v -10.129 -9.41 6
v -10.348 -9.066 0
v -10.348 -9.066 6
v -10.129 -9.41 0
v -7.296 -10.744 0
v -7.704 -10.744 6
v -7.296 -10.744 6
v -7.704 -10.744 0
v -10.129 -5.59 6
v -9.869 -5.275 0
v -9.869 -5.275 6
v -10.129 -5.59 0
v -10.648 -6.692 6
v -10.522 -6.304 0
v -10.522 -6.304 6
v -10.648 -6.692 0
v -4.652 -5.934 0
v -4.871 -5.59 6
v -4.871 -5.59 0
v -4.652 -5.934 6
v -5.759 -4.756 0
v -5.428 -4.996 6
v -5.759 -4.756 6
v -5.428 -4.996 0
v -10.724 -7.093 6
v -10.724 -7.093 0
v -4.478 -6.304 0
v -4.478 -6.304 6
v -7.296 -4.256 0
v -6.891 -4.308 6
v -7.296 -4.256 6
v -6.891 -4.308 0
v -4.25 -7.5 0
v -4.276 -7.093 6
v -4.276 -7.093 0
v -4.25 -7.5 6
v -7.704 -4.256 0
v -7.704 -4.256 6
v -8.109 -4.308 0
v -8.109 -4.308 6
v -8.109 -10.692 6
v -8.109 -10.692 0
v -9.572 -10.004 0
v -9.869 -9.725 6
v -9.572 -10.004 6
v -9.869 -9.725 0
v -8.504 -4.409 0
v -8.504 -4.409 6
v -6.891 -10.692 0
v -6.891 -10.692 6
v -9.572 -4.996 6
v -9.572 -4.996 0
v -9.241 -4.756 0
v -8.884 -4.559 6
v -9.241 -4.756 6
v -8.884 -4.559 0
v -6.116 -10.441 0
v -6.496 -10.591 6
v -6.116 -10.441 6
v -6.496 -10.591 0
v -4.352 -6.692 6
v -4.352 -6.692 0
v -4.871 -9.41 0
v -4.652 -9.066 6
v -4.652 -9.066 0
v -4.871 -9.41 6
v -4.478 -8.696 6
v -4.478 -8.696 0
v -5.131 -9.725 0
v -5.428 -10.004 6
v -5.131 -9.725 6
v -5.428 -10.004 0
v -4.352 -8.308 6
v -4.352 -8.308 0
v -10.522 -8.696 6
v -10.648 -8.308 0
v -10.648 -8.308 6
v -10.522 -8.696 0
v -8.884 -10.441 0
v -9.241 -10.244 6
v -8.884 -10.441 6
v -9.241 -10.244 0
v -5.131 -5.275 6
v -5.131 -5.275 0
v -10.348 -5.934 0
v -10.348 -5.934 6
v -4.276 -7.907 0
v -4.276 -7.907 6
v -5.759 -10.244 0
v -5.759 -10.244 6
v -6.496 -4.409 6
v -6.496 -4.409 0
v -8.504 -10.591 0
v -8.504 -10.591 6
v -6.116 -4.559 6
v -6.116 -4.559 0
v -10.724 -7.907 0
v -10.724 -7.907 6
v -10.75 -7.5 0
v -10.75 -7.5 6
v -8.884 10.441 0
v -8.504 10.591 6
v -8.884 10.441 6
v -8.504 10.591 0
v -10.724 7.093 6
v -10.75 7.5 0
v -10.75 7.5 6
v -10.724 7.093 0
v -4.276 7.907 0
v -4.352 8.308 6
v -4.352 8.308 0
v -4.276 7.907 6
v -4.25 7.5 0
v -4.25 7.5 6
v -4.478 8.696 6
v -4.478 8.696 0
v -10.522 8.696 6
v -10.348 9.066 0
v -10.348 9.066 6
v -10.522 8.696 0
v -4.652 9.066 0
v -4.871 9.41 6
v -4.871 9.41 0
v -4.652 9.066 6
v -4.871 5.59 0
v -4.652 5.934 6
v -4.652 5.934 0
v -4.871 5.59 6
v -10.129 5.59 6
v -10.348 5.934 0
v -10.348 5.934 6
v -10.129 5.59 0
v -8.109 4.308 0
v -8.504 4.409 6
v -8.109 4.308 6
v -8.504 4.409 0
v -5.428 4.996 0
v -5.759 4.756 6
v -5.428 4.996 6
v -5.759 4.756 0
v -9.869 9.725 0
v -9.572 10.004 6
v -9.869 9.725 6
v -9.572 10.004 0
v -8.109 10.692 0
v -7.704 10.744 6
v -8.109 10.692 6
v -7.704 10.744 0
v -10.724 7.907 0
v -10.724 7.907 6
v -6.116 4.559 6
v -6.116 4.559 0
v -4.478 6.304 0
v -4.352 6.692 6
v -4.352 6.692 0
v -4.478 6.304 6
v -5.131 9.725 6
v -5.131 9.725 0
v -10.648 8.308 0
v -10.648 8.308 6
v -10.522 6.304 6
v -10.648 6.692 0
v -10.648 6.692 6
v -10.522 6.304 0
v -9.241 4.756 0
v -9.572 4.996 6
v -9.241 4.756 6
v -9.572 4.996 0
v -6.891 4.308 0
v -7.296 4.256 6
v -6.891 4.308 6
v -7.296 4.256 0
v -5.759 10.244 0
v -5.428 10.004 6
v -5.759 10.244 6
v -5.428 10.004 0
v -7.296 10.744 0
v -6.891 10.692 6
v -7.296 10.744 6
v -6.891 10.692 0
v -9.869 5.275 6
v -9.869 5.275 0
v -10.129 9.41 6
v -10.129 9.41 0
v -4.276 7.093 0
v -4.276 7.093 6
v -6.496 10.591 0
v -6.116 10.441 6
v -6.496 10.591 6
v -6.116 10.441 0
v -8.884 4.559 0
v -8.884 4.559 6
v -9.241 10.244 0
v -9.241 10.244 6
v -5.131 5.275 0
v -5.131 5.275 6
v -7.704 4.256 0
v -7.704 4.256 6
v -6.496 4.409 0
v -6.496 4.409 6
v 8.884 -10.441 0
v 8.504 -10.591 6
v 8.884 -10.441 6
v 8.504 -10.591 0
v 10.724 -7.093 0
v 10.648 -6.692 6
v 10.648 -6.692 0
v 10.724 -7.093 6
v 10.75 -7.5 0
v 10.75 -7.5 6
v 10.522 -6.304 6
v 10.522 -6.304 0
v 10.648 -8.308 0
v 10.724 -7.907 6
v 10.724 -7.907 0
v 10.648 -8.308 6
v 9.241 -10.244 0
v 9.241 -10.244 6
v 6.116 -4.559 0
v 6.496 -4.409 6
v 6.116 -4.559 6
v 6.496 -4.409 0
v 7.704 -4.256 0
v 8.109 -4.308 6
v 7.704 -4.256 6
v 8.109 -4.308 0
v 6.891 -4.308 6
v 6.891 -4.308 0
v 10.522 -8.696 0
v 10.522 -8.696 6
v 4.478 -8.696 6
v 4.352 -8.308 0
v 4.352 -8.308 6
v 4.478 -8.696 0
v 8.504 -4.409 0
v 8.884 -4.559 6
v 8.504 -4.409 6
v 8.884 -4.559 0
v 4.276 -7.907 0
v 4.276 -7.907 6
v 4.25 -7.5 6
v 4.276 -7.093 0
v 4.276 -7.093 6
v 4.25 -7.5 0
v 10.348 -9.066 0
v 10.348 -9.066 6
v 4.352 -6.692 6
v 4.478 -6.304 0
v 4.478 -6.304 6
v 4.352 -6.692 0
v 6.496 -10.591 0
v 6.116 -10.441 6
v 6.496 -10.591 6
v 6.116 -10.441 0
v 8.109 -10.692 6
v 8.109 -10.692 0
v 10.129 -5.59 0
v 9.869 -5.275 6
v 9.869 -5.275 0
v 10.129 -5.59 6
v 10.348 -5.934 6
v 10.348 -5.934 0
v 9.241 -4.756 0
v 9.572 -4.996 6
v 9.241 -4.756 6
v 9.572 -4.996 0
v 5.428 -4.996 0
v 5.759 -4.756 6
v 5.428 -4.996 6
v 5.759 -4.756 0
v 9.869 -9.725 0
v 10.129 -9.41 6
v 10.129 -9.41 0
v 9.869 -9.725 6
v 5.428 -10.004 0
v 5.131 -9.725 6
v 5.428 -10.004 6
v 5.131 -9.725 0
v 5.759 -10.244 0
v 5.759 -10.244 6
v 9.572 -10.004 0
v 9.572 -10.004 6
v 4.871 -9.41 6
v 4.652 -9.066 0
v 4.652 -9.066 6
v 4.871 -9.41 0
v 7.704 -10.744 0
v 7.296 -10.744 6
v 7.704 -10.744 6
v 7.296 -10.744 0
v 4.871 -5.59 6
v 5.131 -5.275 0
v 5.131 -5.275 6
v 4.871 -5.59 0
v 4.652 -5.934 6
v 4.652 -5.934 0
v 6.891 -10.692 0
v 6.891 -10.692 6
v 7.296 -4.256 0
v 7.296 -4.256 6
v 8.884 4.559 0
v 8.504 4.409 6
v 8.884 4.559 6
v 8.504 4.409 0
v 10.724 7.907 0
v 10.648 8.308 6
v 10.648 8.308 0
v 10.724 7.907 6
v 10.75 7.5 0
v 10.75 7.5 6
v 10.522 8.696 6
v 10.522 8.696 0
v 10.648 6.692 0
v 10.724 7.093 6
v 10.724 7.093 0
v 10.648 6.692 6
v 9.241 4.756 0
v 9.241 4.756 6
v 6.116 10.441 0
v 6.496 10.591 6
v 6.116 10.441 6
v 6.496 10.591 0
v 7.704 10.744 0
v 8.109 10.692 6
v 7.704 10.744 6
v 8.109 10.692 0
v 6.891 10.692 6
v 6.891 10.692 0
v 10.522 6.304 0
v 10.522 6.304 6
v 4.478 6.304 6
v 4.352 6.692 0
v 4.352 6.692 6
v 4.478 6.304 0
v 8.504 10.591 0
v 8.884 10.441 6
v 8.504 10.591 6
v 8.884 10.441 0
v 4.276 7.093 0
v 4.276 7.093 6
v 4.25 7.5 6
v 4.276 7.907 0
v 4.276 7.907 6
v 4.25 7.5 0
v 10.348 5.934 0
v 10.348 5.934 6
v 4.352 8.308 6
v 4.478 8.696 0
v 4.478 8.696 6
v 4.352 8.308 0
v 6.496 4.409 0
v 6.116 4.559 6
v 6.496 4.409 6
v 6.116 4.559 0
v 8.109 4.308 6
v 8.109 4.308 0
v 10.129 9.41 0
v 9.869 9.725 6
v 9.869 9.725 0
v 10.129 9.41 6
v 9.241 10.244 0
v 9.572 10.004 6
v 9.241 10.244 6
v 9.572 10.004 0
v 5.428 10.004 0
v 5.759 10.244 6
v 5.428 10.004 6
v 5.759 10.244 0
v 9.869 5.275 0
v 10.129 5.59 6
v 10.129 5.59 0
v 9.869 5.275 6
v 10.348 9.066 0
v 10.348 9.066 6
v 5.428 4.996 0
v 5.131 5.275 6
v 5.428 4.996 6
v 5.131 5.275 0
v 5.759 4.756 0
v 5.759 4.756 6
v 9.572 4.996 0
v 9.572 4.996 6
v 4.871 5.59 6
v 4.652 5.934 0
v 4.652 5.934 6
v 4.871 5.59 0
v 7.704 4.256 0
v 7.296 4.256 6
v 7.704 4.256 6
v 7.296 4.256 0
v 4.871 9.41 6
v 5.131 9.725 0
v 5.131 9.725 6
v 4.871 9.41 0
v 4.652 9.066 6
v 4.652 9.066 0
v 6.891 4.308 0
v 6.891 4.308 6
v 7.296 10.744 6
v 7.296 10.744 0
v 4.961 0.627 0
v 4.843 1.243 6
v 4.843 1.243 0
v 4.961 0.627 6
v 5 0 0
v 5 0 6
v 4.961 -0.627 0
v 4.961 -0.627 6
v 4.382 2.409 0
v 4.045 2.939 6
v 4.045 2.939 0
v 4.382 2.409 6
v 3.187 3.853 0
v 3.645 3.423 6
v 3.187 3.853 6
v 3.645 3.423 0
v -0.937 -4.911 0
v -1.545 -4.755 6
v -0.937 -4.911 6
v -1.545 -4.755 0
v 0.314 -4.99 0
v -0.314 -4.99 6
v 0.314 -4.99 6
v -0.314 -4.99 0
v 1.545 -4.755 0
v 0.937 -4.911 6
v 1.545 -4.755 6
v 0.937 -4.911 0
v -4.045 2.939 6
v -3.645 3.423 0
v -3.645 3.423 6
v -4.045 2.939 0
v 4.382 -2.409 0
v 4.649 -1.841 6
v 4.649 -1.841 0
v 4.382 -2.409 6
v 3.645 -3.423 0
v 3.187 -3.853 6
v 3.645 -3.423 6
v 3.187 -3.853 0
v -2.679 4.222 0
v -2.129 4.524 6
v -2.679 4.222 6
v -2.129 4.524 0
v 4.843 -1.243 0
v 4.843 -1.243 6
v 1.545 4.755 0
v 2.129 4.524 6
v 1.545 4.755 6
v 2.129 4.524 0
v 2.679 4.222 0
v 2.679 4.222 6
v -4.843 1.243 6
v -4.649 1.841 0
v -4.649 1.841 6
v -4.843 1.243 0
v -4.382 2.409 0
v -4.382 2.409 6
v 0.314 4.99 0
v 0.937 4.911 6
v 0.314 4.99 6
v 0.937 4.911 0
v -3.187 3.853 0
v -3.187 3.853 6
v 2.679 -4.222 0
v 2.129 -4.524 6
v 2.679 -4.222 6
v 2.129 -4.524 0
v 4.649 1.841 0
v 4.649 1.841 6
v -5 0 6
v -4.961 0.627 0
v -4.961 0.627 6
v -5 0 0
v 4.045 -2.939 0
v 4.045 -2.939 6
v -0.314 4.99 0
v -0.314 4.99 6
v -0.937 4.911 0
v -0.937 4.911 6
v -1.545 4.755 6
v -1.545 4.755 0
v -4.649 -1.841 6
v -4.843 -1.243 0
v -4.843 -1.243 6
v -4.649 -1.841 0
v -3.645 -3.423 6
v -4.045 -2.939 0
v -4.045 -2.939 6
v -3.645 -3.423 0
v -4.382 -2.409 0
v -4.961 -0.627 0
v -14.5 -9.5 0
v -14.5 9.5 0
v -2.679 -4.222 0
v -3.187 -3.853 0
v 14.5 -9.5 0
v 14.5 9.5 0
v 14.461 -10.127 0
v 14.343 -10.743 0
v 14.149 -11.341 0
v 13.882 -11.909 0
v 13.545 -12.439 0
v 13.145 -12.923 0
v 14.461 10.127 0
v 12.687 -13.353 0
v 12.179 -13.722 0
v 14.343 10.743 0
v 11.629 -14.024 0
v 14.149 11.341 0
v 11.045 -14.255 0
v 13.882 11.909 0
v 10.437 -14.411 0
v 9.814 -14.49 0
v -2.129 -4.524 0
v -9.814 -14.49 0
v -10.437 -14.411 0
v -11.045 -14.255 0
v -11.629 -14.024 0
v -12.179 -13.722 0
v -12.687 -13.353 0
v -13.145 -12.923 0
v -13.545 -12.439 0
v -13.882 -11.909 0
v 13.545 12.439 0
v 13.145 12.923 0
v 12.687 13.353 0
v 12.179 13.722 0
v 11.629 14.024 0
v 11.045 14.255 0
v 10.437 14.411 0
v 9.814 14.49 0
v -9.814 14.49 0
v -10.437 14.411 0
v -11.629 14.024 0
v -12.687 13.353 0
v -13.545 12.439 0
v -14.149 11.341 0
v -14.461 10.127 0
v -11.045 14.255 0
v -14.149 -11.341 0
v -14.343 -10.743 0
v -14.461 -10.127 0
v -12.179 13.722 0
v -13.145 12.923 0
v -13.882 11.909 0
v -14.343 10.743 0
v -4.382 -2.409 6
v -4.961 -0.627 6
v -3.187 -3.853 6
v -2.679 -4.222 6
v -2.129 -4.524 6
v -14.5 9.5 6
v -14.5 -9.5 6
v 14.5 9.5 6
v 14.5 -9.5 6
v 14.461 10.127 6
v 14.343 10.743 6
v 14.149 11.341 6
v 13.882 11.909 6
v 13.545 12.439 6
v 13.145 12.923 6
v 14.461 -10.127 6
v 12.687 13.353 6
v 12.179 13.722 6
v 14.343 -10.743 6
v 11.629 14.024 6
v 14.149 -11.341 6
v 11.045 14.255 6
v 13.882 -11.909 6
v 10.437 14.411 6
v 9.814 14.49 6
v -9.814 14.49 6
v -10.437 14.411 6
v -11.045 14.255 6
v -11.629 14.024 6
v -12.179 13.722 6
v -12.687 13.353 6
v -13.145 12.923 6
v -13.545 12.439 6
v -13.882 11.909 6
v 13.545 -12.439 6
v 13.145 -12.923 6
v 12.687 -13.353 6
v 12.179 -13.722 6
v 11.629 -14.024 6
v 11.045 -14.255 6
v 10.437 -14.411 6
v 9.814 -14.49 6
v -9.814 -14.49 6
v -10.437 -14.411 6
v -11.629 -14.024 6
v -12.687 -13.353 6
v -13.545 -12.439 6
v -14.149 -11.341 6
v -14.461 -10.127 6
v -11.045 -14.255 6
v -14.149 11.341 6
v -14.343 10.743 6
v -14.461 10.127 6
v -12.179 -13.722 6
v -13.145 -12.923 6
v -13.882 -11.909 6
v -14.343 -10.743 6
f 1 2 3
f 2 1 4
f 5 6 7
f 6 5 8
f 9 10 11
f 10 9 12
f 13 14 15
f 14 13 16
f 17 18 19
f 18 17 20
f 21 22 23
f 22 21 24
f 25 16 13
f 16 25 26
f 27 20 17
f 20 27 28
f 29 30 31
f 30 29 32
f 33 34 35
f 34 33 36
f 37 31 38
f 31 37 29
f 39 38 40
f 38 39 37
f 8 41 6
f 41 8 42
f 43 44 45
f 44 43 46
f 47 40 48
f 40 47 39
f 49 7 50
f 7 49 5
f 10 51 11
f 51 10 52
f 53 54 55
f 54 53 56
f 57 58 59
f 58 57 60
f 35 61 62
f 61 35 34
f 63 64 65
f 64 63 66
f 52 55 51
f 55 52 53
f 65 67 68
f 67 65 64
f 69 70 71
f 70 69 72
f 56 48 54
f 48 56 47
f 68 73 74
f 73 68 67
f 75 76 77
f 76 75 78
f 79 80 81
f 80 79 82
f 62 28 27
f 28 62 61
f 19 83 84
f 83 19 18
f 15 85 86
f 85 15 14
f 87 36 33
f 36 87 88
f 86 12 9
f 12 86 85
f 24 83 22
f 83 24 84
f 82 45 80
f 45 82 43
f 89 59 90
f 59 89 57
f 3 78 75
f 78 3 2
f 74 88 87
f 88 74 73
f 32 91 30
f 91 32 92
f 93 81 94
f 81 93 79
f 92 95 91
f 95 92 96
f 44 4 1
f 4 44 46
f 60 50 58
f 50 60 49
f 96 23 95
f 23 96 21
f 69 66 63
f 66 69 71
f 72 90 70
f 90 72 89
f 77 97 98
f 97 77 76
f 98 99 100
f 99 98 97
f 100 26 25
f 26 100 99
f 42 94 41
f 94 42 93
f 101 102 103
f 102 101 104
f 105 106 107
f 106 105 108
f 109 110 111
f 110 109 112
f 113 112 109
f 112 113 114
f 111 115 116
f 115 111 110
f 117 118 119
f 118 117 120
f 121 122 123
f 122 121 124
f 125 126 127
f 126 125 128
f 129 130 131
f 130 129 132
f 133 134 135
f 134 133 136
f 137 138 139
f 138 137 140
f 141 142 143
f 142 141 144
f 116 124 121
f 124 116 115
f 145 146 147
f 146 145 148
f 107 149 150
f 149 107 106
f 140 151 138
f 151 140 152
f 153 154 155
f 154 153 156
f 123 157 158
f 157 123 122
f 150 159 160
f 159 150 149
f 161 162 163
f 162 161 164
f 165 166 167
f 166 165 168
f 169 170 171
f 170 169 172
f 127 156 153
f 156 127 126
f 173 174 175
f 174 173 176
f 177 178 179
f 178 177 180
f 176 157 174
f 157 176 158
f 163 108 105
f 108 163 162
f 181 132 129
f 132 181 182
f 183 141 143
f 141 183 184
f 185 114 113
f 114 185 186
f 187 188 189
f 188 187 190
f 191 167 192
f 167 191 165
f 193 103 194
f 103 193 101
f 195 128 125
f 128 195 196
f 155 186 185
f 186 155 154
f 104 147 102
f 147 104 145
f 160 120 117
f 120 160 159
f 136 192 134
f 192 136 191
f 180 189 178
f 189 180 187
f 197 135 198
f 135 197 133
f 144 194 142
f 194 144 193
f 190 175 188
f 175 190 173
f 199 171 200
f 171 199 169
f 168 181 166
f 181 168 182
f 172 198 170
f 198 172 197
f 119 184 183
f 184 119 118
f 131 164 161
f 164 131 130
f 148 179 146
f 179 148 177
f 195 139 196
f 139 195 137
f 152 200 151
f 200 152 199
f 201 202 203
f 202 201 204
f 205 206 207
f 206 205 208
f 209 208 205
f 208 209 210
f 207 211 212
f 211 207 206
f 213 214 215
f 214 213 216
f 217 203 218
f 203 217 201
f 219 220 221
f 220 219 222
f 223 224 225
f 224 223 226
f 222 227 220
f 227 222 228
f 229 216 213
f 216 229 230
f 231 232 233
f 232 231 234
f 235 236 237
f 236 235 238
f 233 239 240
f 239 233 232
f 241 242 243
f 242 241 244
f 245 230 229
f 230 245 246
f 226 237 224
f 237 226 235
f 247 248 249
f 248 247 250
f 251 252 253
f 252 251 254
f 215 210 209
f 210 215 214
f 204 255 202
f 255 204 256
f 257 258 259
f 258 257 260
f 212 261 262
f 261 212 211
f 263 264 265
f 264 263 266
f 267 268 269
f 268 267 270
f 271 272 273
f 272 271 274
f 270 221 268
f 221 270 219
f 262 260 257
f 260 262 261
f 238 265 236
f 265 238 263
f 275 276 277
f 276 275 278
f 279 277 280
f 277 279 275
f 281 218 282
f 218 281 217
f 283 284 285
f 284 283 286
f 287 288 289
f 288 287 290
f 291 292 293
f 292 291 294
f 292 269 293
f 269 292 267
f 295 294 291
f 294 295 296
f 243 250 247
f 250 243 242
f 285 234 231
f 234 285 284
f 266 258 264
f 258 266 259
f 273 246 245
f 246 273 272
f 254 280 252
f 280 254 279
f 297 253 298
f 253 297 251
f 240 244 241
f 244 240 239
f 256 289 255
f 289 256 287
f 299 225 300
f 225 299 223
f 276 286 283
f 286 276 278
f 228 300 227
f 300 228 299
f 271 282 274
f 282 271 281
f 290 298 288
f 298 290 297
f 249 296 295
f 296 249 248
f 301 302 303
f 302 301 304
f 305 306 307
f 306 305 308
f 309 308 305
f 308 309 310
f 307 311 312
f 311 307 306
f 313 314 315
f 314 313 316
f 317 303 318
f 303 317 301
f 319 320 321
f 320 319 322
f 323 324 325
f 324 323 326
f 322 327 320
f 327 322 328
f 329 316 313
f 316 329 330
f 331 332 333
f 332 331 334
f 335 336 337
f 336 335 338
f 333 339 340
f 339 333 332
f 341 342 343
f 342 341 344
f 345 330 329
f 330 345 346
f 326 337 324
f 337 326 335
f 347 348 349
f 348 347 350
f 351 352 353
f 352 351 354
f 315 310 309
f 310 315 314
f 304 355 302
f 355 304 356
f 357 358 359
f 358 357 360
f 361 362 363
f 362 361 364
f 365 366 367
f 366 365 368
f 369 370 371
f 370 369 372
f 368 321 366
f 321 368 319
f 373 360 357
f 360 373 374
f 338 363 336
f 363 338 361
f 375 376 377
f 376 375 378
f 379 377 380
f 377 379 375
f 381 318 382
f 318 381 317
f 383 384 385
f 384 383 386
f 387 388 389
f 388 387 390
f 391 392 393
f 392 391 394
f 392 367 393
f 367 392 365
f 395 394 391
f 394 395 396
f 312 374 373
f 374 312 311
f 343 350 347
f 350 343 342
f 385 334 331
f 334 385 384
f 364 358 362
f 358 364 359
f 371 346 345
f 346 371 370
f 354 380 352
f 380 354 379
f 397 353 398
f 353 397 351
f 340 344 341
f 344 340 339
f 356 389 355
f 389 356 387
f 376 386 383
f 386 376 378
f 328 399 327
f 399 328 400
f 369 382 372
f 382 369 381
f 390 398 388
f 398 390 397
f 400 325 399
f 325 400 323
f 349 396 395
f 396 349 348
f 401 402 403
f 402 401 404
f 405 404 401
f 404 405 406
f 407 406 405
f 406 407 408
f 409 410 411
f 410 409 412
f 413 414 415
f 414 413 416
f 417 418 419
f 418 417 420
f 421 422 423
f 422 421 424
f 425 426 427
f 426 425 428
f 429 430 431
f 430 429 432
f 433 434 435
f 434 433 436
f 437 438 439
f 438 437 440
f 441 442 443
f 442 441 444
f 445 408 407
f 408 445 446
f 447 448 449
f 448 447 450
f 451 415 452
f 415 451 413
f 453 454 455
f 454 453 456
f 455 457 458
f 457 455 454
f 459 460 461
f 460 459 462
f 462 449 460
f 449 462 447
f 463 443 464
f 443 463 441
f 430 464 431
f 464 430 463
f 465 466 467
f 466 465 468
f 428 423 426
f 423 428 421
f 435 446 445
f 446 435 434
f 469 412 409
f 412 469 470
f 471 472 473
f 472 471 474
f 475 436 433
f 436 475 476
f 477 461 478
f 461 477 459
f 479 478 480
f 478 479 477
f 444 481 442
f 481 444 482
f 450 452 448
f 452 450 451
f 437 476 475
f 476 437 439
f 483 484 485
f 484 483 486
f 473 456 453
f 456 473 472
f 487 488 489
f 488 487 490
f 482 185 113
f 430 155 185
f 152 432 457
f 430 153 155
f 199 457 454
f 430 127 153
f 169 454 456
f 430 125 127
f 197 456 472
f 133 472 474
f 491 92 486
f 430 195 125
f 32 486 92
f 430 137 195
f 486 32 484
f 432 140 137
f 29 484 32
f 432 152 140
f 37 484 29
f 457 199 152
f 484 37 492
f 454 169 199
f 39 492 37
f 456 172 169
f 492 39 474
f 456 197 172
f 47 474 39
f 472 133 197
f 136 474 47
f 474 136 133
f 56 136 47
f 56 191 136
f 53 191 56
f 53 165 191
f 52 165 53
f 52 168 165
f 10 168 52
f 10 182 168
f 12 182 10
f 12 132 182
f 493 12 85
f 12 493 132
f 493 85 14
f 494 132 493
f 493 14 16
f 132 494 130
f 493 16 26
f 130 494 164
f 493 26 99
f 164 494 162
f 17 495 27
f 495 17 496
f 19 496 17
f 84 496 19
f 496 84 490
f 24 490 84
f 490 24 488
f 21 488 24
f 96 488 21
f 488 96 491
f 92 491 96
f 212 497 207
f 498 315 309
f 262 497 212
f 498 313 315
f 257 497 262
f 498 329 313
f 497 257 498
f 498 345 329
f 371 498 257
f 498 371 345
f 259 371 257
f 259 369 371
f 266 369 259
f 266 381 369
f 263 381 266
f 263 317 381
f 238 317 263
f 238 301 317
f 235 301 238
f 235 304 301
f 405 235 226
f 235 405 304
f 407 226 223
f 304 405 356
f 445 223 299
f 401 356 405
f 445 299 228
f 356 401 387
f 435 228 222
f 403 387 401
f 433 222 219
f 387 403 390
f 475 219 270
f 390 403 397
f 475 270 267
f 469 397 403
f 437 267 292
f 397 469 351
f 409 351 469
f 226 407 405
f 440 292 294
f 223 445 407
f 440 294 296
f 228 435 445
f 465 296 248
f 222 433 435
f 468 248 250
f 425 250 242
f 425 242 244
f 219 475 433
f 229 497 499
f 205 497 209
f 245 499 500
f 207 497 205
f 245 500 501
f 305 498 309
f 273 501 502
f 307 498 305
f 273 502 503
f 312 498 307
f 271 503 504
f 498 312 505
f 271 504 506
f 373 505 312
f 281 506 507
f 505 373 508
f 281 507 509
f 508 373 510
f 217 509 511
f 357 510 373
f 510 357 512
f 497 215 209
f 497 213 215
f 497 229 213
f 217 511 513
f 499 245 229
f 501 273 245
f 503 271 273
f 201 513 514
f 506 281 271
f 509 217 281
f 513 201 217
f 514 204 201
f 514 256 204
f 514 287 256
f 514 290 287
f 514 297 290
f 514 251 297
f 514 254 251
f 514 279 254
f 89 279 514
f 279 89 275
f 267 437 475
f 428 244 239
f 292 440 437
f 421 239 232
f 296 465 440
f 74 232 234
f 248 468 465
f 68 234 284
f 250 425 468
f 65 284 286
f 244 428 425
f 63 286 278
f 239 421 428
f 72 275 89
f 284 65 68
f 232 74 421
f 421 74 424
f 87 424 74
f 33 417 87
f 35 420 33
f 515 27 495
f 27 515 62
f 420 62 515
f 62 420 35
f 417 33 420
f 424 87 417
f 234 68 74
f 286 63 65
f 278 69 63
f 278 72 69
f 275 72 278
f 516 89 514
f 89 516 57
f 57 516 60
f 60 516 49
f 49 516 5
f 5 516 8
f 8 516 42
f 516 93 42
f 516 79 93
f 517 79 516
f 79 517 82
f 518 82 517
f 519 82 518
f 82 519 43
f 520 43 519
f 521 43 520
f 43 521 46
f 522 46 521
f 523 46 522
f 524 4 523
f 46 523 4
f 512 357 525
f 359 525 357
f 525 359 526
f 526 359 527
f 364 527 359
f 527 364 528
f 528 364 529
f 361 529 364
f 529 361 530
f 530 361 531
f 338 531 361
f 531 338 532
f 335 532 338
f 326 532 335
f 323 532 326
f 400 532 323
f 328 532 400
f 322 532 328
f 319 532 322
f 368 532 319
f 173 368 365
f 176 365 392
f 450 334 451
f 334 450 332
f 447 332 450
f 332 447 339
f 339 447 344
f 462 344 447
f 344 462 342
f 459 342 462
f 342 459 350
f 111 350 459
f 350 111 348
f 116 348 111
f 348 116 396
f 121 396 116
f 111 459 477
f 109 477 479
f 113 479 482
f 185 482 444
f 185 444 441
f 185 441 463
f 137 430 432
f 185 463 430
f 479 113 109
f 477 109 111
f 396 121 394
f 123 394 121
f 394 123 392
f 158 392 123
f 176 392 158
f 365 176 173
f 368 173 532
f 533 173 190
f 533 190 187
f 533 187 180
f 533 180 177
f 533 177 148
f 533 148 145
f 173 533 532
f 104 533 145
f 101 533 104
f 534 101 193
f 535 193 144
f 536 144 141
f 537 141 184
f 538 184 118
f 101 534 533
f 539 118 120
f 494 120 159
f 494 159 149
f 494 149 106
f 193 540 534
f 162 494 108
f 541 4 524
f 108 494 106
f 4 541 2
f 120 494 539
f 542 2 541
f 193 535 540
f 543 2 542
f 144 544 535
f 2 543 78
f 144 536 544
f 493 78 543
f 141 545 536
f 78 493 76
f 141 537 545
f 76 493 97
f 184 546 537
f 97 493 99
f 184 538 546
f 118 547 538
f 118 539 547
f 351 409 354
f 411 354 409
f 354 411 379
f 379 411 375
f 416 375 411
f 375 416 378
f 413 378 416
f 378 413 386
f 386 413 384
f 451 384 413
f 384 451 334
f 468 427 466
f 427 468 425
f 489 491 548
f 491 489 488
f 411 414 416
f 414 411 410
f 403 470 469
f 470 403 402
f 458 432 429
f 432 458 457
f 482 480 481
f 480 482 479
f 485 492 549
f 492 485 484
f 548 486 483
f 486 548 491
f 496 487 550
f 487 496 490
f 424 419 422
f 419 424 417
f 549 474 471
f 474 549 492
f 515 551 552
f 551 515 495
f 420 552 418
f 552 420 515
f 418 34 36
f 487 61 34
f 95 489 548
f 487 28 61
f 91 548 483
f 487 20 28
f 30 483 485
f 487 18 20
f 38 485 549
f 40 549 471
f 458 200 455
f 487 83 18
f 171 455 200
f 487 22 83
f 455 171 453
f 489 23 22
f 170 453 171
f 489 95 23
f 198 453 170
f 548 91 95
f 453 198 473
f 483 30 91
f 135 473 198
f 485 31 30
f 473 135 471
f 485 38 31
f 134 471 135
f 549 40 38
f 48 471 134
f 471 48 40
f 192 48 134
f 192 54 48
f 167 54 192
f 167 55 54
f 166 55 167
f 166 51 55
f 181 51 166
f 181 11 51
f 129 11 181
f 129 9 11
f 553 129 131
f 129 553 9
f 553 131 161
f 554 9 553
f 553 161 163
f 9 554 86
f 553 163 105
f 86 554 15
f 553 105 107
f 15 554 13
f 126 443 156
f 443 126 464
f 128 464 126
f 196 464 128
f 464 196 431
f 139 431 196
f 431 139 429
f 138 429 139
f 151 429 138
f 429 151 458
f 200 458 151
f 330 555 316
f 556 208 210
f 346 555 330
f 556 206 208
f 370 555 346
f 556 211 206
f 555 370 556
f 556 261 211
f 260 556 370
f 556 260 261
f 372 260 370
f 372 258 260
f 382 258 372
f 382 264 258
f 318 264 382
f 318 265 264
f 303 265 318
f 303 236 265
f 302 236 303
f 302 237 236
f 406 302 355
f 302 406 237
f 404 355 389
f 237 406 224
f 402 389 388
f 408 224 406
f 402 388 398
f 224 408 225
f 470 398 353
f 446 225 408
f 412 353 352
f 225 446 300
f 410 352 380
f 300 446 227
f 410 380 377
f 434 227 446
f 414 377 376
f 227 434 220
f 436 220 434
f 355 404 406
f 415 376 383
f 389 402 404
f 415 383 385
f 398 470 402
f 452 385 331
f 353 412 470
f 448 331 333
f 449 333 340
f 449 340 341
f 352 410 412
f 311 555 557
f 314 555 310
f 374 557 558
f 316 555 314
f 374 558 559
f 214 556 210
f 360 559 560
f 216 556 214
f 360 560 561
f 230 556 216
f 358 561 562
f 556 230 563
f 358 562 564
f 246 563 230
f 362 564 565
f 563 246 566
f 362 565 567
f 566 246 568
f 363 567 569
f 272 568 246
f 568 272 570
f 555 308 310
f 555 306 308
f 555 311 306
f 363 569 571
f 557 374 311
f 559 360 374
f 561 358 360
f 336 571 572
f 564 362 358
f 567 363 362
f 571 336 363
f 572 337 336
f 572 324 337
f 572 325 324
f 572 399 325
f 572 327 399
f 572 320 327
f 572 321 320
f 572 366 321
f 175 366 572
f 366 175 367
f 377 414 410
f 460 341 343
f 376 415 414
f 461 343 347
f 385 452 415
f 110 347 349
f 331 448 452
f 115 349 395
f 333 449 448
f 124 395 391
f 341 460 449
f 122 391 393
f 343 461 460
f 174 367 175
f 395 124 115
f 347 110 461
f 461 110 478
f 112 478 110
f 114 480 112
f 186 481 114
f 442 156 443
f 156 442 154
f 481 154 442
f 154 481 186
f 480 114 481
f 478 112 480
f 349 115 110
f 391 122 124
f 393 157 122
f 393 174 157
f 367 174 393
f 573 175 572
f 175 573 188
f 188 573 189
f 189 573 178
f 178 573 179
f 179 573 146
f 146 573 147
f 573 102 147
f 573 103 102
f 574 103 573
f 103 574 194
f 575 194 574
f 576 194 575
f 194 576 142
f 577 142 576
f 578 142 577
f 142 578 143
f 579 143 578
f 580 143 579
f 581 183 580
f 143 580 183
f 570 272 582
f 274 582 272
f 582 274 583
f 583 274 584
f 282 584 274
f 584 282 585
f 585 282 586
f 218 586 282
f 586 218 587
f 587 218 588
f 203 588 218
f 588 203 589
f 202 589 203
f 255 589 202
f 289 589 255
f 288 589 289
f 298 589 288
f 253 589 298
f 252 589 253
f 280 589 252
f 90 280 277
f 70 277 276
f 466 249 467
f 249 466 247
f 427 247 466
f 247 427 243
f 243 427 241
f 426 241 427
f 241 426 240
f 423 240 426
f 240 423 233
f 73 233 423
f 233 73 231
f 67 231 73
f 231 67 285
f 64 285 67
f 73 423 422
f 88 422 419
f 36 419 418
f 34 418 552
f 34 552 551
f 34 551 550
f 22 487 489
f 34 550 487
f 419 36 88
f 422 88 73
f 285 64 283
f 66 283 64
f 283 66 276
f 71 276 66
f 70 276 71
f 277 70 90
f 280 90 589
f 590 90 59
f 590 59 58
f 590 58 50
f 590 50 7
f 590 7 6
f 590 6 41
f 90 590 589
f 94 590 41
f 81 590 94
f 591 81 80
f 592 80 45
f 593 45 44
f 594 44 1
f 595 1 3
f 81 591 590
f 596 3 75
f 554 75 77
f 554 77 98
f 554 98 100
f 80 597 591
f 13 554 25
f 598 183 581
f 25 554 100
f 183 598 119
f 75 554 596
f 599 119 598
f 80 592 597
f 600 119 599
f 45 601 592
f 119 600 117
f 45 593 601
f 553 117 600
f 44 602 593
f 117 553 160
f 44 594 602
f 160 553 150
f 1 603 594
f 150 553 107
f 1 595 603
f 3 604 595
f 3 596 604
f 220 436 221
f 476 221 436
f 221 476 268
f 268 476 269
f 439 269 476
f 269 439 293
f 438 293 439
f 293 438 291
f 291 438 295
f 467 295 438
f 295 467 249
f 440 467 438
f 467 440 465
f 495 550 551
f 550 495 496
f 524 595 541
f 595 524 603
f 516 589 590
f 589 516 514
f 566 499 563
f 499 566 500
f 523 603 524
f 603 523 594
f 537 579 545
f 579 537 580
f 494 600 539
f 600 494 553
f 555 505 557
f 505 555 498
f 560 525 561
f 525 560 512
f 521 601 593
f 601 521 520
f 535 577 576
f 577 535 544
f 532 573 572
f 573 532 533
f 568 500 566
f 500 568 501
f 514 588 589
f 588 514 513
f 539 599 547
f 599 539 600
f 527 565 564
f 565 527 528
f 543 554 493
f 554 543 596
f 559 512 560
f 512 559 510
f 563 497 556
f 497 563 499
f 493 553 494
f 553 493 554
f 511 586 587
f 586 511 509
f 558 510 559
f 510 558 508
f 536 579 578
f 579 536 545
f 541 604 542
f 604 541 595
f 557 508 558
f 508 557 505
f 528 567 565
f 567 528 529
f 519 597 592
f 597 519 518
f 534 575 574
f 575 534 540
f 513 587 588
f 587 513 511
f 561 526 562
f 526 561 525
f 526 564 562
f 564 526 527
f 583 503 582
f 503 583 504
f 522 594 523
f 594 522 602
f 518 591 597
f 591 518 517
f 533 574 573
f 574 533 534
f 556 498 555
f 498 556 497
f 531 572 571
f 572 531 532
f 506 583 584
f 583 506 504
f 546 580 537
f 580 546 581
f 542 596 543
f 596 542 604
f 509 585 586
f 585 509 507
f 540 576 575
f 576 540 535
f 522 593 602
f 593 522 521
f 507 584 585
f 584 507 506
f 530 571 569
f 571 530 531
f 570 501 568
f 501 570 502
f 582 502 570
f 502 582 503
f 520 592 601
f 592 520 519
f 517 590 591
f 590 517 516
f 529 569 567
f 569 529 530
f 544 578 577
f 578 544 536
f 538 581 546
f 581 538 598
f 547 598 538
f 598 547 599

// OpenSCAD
$fn = 50;


difference() {
	union() {
		hull() {
			translate(v = [-9.5000000000, 9.5000000000, 0]) {
				cylinder(h = 6, r = 5);
			}
			translate(v = [9.5000000000, 9.5000000000, 0]) {
				cylinder(h = 6, r = 5);
			}
			translate(v = [-9.5000000000, -9.5000000000, 0]) {
				cylinder(h = 6, r = 5);
			}
			translate(v = [9.5000000000, -9.5000000000, 0]) {
				cylinder(h = 6, r = 5);
			}
		}
	}
	union() {
		#translate(v = [-7.5000000000, -7.5000000000, -100.0000000000]) {
			cylinder(h = 200, r = 3.2500000000);
		}
		#translate(v = [-7.5000000000, 7.5000000000, -100.0000000000]) {
			cylinder(h = 200, r = 3.2500000000);
		}
		#translate(v = [7.5000000000, -7.5000000000, -100.0000000000]) {
			cylinder(h = 200, r = 3.2500000000);
		}
		#translate(v = [7.5000000000, 7.5000000000, -100.0000000000]) {
			cylinder(h = 200, r = 3.2500000000);
		}
		#cylinder(h = 6, r = 5.0000000000);
	}
}
